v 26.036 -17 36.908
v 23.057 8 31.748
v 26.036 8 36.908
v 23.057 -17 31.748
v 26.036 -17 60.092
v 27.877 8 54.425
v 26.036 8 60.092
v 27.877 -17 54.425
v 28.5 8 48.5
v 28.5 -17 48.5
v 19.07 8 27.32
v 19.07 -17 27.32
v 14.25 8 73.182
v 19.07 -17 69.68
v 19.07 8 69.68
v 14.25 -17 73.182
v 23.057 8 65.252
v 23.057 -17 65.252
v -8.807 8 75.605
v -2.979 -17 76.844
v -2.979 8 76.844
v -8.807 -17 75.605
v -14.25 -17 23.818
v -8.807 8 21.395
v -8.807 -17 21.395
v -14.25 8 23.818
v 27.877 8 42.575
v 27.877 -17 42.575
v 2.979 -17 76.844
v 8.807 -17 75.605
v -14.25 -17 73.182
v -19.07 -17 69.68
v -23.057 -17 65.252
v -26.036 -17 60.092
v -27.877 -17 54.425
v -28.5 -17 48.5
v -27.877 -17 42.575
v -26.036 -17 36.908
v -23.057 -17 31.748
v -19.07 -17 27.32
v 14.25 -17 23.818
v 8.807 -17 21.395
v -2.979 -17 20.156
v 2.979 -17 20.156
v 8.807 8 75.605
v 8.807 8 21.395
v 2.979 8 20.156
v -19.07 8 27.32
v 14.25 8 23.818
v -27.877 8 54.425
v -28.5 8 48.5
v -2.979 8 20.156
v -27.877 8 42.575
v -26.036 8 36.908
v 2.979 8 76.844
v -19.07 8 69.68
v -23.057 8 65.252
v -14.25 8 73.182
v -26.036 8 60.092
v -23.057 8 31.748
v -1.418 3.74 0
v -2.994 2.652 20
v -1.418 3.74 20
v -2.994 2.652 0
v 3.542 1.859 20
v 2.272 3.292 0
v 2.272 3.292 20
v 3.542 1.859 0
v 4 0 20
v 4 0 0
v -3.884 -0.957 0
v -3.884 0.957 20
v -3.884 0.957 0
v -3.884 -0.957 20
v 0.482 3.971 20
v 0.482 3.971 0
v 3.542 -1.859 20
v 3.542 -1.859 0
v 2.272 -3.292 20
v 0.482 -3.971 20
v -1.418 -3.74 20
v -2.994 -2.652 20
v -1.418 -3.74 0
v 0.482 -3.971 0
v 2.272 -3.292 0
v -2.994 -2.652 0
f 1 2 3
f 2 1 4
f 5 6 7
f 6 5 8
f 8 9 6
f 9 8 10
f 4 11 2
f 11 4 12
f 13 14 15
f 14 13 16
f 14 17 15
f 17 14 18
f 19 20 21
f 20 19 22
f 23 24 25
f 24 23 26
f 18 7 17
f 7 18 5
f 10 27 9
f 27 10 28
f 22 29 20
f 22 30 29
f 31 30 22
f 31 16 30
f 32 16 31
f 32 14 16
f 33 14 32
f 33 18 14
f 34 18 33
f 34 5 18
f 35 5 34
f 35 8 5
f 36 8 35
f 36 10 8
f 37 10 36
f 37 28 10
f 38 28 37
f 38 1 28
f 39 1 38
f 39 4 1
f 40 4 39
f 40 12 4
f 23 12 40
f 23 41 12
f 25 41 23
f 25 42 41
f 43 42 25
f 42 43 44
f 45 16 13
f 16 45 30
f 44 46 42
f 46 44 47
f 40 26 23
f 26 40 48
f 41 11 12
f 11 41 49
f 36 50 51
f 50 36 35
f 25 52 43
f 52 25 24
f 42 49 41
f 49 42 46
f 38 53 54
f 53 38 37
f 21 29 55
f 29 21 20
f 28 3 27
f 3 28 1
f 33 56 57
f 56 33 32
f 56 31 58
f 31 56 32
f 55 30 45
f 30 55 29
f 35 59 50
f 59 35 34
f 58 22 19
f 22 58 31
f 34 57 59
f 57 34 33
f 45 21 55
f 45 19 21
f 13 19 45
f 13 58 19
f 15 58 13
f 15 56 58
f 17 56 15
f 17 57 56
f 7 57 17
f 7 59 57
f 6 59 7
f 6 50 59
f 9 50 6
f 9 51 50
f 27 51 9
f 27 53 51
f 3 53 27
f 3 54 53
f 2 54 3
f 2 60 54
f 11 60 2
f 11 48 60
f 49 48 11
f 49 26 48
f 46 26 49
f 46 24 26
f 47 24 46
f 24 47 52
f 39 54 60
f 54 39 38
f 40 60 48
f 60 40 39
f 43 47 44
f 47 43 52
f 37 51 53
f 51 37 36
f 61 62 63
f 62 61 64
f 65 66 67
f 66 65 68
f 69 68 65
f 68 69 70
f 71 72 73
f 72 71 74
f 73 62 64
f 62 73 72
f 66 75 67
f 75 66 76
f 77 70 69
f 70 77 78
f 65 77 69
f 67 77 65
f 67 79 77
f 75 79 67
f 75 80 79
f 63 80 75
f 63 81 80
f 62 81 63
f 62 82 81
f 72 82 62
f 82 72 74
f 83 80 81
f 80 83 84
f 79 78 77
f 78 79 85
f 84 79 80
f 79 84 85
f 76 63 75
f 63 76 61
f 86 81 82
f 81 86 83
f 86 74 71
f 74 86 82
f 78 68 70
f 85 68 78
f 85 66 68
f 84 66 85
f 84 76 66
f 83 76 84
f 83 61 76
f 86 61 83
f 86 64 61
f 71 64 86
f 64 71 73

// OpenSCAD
/*
Dial Gauge Model

Parameters:
    diameter - The diameter of the dial body
    width - The width of the dial body
    mount_diameter - The diameter of the mount rod
    mount_lenght - The length of the mount rod
    mount_center_distance - The distance from the back of the dial body to the center of the mount rod
*/
module Dial_Gauge(diameter, width, mount_diameter, mount_lenght, mount_center_distance)
{
 
 translate([0, mount_center_distance, diameter/2 + mount_lenght]) rotate([90,0,0]) cylinder(h=width, d=diameter);
 cylinder(h=mount_lenght, d=mount_diameter);
 
 
    
}

// Test model
diameter = 57;
width = 25;
mount_diameter = 8;
mount_lenght = 20;
mount_center_distance = 8;
Dial_Gauge(diameter, width, mount_diameter, mount_lenght, mount_center_distance);
